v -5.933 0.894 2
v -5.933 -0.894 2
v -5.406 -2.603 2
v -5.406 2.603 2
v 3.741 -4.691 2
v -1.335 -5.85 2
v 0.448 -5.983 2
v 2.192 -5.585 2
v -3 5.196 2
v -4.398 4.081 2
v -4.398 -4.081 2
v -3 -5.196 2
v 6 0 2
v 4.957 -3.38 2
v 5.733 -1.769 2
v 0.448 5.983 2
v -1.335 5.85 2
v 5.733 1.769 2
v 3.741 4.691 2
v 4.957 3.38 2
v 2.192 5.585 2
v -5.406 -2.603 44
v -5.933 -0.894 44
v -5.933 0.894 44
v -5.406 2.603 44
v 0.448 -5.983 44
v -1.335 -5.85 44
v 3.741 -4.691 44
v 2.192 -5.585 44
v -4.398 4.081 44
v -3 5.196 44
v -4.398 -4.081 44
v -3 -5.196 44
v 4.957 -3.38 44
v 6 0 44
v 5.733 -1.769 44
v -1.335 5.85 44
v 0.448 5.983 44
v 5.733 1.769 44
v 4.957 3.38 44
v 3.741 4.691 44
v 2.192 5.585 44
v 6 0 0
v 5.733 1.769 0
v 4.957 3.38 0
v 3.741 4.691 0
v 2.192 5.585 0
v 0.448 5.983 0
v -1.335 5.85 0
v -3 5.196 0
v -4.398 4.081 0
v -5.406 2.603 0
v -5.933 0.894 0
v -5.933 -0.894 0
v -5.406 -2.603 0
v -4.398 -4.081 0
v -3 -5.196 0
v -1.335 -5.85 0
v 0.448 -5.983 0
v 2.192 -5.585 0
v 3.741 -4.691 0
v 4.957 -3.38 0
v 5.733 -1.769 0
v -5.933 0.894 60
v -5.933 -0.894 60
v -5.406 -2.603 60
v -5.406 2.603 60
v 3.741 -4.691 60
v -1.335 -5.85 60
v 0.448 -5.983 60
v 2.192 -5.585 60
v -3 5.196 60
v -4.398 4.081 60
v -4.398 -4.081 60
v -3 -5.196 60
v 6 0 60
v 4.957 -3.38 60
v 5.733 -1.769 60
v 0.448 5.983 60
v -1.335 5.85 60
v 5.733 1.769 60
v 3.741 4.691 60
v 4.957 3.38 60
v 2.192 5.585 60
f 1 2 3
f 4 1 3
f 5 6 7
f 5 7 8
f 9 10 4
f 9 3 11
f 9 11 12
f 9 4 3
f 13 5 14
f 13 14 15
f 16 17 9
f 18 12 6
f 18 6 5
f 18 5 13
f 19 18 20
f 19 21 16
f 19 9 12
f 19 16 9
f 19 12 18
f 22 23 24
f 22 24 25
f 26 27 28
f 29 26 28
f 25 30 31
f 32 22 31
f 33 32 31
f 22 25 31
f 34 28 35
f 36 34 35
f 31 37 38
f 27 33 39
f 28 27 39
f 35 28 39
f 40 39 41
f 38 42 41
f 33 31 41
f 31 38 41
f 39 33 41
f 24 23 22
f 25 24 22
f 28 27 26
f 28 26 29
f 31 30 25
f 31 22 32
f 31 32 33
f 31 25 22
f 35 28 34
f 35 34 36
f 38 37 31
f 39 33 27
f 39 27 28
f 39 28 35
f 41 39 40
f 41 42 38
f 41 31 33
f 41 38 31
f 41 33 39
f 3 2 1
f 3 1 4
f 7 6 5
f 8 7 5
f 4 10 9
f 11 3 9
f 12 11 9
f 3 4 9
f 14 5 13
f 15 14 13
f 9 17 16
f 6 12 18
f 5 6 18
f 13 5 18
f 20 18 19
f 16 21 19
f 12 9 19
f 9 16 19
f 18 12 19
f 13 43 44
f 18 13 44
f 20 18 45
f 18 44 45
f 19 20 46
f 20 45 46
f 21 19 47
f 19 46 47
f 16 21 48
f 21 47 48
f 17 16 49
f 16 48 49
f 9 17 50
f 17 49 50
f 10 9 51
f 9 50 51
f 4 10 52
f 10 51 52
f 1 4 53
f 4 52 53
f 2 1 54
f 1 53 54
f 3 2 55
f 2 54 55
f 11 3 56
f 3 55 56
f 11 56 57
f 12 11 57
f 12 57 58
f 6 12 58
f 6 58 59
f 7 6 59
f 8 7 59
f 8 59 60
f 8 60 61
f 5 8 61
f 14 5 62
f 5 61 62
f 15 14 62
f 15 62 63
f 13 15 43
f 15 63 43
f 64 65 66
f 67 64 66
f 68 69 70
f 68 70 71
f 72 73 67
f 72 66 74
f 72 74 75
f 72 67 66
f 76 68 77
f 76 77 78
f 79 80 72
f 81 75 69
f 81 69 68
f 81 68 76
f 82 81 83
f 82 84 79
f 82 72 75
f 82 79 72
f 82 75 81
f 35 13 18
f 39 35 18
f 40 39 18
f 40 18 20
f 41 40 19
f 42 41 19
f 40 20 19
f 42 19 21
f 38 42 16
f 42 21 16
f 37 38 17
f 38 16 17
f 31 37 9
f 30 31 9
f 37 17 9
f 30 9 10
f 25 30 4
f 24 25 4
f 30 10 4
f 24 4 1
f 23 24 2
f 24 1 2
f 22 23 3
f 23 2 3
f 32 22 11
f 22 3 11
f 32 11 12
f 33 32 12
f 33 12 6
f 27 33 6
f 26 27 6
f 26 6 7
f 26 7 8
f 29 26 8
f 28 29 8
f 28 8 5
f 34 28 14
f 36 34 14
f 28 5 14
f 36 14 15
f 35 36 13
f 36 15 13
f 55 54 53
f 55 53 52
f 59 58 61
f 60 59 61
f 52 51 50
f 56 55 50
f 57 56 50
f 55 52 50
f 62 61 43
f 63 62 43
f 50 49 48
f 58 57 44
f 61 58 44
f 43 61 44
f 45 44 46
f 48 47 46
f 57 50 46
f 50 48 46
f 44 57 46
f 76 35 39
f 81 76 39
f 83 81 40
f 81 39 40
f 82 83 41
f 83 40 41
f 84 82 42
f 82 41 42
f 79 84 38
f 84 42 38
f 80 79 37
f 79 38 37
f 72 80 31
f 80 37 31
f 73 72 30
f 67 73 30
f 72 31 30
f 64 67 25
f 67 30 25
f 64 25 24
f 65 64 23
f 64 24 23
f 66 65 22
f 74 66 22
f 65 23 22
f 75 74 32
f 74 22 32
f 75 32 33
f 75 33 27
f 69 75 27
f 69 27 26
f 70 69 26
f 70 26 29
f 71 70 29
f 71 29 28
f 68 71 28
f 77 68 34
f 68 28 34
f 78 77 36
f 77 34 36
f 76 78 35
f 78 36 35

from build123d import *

# Parameters (mm, degrees)
F0_R     = 6
F1_DEPTH = 2
F2_R     = 6
F3_DEPTH = 42
F4_R     = 6
F5_DEPTH = 16


with BuildPart() as f1:
    # F0 (on Top) → F1 (new body)
    with BuildSketch(Plane.XY):
        Circle(F0_R)
    extrude(amount=F1_DEPTH)


with BuildPart() as f3:
    # F2 (on face) → F3 (new body)
    with BuildSketch(Plane.XY.offset(2)):
        Circle(F2_R)
    extrude(amount=F3_DEPTH)


with BuildPart() as f5:
    # F4 (on face) → F5 (new body)
    with BuildSketch(Plane.XY.offset(44)):
        Circle(F4_R)
    extrude(amount=F5_DEPTH)


solid = Compound([f1.part, f3.part, f5.part])
